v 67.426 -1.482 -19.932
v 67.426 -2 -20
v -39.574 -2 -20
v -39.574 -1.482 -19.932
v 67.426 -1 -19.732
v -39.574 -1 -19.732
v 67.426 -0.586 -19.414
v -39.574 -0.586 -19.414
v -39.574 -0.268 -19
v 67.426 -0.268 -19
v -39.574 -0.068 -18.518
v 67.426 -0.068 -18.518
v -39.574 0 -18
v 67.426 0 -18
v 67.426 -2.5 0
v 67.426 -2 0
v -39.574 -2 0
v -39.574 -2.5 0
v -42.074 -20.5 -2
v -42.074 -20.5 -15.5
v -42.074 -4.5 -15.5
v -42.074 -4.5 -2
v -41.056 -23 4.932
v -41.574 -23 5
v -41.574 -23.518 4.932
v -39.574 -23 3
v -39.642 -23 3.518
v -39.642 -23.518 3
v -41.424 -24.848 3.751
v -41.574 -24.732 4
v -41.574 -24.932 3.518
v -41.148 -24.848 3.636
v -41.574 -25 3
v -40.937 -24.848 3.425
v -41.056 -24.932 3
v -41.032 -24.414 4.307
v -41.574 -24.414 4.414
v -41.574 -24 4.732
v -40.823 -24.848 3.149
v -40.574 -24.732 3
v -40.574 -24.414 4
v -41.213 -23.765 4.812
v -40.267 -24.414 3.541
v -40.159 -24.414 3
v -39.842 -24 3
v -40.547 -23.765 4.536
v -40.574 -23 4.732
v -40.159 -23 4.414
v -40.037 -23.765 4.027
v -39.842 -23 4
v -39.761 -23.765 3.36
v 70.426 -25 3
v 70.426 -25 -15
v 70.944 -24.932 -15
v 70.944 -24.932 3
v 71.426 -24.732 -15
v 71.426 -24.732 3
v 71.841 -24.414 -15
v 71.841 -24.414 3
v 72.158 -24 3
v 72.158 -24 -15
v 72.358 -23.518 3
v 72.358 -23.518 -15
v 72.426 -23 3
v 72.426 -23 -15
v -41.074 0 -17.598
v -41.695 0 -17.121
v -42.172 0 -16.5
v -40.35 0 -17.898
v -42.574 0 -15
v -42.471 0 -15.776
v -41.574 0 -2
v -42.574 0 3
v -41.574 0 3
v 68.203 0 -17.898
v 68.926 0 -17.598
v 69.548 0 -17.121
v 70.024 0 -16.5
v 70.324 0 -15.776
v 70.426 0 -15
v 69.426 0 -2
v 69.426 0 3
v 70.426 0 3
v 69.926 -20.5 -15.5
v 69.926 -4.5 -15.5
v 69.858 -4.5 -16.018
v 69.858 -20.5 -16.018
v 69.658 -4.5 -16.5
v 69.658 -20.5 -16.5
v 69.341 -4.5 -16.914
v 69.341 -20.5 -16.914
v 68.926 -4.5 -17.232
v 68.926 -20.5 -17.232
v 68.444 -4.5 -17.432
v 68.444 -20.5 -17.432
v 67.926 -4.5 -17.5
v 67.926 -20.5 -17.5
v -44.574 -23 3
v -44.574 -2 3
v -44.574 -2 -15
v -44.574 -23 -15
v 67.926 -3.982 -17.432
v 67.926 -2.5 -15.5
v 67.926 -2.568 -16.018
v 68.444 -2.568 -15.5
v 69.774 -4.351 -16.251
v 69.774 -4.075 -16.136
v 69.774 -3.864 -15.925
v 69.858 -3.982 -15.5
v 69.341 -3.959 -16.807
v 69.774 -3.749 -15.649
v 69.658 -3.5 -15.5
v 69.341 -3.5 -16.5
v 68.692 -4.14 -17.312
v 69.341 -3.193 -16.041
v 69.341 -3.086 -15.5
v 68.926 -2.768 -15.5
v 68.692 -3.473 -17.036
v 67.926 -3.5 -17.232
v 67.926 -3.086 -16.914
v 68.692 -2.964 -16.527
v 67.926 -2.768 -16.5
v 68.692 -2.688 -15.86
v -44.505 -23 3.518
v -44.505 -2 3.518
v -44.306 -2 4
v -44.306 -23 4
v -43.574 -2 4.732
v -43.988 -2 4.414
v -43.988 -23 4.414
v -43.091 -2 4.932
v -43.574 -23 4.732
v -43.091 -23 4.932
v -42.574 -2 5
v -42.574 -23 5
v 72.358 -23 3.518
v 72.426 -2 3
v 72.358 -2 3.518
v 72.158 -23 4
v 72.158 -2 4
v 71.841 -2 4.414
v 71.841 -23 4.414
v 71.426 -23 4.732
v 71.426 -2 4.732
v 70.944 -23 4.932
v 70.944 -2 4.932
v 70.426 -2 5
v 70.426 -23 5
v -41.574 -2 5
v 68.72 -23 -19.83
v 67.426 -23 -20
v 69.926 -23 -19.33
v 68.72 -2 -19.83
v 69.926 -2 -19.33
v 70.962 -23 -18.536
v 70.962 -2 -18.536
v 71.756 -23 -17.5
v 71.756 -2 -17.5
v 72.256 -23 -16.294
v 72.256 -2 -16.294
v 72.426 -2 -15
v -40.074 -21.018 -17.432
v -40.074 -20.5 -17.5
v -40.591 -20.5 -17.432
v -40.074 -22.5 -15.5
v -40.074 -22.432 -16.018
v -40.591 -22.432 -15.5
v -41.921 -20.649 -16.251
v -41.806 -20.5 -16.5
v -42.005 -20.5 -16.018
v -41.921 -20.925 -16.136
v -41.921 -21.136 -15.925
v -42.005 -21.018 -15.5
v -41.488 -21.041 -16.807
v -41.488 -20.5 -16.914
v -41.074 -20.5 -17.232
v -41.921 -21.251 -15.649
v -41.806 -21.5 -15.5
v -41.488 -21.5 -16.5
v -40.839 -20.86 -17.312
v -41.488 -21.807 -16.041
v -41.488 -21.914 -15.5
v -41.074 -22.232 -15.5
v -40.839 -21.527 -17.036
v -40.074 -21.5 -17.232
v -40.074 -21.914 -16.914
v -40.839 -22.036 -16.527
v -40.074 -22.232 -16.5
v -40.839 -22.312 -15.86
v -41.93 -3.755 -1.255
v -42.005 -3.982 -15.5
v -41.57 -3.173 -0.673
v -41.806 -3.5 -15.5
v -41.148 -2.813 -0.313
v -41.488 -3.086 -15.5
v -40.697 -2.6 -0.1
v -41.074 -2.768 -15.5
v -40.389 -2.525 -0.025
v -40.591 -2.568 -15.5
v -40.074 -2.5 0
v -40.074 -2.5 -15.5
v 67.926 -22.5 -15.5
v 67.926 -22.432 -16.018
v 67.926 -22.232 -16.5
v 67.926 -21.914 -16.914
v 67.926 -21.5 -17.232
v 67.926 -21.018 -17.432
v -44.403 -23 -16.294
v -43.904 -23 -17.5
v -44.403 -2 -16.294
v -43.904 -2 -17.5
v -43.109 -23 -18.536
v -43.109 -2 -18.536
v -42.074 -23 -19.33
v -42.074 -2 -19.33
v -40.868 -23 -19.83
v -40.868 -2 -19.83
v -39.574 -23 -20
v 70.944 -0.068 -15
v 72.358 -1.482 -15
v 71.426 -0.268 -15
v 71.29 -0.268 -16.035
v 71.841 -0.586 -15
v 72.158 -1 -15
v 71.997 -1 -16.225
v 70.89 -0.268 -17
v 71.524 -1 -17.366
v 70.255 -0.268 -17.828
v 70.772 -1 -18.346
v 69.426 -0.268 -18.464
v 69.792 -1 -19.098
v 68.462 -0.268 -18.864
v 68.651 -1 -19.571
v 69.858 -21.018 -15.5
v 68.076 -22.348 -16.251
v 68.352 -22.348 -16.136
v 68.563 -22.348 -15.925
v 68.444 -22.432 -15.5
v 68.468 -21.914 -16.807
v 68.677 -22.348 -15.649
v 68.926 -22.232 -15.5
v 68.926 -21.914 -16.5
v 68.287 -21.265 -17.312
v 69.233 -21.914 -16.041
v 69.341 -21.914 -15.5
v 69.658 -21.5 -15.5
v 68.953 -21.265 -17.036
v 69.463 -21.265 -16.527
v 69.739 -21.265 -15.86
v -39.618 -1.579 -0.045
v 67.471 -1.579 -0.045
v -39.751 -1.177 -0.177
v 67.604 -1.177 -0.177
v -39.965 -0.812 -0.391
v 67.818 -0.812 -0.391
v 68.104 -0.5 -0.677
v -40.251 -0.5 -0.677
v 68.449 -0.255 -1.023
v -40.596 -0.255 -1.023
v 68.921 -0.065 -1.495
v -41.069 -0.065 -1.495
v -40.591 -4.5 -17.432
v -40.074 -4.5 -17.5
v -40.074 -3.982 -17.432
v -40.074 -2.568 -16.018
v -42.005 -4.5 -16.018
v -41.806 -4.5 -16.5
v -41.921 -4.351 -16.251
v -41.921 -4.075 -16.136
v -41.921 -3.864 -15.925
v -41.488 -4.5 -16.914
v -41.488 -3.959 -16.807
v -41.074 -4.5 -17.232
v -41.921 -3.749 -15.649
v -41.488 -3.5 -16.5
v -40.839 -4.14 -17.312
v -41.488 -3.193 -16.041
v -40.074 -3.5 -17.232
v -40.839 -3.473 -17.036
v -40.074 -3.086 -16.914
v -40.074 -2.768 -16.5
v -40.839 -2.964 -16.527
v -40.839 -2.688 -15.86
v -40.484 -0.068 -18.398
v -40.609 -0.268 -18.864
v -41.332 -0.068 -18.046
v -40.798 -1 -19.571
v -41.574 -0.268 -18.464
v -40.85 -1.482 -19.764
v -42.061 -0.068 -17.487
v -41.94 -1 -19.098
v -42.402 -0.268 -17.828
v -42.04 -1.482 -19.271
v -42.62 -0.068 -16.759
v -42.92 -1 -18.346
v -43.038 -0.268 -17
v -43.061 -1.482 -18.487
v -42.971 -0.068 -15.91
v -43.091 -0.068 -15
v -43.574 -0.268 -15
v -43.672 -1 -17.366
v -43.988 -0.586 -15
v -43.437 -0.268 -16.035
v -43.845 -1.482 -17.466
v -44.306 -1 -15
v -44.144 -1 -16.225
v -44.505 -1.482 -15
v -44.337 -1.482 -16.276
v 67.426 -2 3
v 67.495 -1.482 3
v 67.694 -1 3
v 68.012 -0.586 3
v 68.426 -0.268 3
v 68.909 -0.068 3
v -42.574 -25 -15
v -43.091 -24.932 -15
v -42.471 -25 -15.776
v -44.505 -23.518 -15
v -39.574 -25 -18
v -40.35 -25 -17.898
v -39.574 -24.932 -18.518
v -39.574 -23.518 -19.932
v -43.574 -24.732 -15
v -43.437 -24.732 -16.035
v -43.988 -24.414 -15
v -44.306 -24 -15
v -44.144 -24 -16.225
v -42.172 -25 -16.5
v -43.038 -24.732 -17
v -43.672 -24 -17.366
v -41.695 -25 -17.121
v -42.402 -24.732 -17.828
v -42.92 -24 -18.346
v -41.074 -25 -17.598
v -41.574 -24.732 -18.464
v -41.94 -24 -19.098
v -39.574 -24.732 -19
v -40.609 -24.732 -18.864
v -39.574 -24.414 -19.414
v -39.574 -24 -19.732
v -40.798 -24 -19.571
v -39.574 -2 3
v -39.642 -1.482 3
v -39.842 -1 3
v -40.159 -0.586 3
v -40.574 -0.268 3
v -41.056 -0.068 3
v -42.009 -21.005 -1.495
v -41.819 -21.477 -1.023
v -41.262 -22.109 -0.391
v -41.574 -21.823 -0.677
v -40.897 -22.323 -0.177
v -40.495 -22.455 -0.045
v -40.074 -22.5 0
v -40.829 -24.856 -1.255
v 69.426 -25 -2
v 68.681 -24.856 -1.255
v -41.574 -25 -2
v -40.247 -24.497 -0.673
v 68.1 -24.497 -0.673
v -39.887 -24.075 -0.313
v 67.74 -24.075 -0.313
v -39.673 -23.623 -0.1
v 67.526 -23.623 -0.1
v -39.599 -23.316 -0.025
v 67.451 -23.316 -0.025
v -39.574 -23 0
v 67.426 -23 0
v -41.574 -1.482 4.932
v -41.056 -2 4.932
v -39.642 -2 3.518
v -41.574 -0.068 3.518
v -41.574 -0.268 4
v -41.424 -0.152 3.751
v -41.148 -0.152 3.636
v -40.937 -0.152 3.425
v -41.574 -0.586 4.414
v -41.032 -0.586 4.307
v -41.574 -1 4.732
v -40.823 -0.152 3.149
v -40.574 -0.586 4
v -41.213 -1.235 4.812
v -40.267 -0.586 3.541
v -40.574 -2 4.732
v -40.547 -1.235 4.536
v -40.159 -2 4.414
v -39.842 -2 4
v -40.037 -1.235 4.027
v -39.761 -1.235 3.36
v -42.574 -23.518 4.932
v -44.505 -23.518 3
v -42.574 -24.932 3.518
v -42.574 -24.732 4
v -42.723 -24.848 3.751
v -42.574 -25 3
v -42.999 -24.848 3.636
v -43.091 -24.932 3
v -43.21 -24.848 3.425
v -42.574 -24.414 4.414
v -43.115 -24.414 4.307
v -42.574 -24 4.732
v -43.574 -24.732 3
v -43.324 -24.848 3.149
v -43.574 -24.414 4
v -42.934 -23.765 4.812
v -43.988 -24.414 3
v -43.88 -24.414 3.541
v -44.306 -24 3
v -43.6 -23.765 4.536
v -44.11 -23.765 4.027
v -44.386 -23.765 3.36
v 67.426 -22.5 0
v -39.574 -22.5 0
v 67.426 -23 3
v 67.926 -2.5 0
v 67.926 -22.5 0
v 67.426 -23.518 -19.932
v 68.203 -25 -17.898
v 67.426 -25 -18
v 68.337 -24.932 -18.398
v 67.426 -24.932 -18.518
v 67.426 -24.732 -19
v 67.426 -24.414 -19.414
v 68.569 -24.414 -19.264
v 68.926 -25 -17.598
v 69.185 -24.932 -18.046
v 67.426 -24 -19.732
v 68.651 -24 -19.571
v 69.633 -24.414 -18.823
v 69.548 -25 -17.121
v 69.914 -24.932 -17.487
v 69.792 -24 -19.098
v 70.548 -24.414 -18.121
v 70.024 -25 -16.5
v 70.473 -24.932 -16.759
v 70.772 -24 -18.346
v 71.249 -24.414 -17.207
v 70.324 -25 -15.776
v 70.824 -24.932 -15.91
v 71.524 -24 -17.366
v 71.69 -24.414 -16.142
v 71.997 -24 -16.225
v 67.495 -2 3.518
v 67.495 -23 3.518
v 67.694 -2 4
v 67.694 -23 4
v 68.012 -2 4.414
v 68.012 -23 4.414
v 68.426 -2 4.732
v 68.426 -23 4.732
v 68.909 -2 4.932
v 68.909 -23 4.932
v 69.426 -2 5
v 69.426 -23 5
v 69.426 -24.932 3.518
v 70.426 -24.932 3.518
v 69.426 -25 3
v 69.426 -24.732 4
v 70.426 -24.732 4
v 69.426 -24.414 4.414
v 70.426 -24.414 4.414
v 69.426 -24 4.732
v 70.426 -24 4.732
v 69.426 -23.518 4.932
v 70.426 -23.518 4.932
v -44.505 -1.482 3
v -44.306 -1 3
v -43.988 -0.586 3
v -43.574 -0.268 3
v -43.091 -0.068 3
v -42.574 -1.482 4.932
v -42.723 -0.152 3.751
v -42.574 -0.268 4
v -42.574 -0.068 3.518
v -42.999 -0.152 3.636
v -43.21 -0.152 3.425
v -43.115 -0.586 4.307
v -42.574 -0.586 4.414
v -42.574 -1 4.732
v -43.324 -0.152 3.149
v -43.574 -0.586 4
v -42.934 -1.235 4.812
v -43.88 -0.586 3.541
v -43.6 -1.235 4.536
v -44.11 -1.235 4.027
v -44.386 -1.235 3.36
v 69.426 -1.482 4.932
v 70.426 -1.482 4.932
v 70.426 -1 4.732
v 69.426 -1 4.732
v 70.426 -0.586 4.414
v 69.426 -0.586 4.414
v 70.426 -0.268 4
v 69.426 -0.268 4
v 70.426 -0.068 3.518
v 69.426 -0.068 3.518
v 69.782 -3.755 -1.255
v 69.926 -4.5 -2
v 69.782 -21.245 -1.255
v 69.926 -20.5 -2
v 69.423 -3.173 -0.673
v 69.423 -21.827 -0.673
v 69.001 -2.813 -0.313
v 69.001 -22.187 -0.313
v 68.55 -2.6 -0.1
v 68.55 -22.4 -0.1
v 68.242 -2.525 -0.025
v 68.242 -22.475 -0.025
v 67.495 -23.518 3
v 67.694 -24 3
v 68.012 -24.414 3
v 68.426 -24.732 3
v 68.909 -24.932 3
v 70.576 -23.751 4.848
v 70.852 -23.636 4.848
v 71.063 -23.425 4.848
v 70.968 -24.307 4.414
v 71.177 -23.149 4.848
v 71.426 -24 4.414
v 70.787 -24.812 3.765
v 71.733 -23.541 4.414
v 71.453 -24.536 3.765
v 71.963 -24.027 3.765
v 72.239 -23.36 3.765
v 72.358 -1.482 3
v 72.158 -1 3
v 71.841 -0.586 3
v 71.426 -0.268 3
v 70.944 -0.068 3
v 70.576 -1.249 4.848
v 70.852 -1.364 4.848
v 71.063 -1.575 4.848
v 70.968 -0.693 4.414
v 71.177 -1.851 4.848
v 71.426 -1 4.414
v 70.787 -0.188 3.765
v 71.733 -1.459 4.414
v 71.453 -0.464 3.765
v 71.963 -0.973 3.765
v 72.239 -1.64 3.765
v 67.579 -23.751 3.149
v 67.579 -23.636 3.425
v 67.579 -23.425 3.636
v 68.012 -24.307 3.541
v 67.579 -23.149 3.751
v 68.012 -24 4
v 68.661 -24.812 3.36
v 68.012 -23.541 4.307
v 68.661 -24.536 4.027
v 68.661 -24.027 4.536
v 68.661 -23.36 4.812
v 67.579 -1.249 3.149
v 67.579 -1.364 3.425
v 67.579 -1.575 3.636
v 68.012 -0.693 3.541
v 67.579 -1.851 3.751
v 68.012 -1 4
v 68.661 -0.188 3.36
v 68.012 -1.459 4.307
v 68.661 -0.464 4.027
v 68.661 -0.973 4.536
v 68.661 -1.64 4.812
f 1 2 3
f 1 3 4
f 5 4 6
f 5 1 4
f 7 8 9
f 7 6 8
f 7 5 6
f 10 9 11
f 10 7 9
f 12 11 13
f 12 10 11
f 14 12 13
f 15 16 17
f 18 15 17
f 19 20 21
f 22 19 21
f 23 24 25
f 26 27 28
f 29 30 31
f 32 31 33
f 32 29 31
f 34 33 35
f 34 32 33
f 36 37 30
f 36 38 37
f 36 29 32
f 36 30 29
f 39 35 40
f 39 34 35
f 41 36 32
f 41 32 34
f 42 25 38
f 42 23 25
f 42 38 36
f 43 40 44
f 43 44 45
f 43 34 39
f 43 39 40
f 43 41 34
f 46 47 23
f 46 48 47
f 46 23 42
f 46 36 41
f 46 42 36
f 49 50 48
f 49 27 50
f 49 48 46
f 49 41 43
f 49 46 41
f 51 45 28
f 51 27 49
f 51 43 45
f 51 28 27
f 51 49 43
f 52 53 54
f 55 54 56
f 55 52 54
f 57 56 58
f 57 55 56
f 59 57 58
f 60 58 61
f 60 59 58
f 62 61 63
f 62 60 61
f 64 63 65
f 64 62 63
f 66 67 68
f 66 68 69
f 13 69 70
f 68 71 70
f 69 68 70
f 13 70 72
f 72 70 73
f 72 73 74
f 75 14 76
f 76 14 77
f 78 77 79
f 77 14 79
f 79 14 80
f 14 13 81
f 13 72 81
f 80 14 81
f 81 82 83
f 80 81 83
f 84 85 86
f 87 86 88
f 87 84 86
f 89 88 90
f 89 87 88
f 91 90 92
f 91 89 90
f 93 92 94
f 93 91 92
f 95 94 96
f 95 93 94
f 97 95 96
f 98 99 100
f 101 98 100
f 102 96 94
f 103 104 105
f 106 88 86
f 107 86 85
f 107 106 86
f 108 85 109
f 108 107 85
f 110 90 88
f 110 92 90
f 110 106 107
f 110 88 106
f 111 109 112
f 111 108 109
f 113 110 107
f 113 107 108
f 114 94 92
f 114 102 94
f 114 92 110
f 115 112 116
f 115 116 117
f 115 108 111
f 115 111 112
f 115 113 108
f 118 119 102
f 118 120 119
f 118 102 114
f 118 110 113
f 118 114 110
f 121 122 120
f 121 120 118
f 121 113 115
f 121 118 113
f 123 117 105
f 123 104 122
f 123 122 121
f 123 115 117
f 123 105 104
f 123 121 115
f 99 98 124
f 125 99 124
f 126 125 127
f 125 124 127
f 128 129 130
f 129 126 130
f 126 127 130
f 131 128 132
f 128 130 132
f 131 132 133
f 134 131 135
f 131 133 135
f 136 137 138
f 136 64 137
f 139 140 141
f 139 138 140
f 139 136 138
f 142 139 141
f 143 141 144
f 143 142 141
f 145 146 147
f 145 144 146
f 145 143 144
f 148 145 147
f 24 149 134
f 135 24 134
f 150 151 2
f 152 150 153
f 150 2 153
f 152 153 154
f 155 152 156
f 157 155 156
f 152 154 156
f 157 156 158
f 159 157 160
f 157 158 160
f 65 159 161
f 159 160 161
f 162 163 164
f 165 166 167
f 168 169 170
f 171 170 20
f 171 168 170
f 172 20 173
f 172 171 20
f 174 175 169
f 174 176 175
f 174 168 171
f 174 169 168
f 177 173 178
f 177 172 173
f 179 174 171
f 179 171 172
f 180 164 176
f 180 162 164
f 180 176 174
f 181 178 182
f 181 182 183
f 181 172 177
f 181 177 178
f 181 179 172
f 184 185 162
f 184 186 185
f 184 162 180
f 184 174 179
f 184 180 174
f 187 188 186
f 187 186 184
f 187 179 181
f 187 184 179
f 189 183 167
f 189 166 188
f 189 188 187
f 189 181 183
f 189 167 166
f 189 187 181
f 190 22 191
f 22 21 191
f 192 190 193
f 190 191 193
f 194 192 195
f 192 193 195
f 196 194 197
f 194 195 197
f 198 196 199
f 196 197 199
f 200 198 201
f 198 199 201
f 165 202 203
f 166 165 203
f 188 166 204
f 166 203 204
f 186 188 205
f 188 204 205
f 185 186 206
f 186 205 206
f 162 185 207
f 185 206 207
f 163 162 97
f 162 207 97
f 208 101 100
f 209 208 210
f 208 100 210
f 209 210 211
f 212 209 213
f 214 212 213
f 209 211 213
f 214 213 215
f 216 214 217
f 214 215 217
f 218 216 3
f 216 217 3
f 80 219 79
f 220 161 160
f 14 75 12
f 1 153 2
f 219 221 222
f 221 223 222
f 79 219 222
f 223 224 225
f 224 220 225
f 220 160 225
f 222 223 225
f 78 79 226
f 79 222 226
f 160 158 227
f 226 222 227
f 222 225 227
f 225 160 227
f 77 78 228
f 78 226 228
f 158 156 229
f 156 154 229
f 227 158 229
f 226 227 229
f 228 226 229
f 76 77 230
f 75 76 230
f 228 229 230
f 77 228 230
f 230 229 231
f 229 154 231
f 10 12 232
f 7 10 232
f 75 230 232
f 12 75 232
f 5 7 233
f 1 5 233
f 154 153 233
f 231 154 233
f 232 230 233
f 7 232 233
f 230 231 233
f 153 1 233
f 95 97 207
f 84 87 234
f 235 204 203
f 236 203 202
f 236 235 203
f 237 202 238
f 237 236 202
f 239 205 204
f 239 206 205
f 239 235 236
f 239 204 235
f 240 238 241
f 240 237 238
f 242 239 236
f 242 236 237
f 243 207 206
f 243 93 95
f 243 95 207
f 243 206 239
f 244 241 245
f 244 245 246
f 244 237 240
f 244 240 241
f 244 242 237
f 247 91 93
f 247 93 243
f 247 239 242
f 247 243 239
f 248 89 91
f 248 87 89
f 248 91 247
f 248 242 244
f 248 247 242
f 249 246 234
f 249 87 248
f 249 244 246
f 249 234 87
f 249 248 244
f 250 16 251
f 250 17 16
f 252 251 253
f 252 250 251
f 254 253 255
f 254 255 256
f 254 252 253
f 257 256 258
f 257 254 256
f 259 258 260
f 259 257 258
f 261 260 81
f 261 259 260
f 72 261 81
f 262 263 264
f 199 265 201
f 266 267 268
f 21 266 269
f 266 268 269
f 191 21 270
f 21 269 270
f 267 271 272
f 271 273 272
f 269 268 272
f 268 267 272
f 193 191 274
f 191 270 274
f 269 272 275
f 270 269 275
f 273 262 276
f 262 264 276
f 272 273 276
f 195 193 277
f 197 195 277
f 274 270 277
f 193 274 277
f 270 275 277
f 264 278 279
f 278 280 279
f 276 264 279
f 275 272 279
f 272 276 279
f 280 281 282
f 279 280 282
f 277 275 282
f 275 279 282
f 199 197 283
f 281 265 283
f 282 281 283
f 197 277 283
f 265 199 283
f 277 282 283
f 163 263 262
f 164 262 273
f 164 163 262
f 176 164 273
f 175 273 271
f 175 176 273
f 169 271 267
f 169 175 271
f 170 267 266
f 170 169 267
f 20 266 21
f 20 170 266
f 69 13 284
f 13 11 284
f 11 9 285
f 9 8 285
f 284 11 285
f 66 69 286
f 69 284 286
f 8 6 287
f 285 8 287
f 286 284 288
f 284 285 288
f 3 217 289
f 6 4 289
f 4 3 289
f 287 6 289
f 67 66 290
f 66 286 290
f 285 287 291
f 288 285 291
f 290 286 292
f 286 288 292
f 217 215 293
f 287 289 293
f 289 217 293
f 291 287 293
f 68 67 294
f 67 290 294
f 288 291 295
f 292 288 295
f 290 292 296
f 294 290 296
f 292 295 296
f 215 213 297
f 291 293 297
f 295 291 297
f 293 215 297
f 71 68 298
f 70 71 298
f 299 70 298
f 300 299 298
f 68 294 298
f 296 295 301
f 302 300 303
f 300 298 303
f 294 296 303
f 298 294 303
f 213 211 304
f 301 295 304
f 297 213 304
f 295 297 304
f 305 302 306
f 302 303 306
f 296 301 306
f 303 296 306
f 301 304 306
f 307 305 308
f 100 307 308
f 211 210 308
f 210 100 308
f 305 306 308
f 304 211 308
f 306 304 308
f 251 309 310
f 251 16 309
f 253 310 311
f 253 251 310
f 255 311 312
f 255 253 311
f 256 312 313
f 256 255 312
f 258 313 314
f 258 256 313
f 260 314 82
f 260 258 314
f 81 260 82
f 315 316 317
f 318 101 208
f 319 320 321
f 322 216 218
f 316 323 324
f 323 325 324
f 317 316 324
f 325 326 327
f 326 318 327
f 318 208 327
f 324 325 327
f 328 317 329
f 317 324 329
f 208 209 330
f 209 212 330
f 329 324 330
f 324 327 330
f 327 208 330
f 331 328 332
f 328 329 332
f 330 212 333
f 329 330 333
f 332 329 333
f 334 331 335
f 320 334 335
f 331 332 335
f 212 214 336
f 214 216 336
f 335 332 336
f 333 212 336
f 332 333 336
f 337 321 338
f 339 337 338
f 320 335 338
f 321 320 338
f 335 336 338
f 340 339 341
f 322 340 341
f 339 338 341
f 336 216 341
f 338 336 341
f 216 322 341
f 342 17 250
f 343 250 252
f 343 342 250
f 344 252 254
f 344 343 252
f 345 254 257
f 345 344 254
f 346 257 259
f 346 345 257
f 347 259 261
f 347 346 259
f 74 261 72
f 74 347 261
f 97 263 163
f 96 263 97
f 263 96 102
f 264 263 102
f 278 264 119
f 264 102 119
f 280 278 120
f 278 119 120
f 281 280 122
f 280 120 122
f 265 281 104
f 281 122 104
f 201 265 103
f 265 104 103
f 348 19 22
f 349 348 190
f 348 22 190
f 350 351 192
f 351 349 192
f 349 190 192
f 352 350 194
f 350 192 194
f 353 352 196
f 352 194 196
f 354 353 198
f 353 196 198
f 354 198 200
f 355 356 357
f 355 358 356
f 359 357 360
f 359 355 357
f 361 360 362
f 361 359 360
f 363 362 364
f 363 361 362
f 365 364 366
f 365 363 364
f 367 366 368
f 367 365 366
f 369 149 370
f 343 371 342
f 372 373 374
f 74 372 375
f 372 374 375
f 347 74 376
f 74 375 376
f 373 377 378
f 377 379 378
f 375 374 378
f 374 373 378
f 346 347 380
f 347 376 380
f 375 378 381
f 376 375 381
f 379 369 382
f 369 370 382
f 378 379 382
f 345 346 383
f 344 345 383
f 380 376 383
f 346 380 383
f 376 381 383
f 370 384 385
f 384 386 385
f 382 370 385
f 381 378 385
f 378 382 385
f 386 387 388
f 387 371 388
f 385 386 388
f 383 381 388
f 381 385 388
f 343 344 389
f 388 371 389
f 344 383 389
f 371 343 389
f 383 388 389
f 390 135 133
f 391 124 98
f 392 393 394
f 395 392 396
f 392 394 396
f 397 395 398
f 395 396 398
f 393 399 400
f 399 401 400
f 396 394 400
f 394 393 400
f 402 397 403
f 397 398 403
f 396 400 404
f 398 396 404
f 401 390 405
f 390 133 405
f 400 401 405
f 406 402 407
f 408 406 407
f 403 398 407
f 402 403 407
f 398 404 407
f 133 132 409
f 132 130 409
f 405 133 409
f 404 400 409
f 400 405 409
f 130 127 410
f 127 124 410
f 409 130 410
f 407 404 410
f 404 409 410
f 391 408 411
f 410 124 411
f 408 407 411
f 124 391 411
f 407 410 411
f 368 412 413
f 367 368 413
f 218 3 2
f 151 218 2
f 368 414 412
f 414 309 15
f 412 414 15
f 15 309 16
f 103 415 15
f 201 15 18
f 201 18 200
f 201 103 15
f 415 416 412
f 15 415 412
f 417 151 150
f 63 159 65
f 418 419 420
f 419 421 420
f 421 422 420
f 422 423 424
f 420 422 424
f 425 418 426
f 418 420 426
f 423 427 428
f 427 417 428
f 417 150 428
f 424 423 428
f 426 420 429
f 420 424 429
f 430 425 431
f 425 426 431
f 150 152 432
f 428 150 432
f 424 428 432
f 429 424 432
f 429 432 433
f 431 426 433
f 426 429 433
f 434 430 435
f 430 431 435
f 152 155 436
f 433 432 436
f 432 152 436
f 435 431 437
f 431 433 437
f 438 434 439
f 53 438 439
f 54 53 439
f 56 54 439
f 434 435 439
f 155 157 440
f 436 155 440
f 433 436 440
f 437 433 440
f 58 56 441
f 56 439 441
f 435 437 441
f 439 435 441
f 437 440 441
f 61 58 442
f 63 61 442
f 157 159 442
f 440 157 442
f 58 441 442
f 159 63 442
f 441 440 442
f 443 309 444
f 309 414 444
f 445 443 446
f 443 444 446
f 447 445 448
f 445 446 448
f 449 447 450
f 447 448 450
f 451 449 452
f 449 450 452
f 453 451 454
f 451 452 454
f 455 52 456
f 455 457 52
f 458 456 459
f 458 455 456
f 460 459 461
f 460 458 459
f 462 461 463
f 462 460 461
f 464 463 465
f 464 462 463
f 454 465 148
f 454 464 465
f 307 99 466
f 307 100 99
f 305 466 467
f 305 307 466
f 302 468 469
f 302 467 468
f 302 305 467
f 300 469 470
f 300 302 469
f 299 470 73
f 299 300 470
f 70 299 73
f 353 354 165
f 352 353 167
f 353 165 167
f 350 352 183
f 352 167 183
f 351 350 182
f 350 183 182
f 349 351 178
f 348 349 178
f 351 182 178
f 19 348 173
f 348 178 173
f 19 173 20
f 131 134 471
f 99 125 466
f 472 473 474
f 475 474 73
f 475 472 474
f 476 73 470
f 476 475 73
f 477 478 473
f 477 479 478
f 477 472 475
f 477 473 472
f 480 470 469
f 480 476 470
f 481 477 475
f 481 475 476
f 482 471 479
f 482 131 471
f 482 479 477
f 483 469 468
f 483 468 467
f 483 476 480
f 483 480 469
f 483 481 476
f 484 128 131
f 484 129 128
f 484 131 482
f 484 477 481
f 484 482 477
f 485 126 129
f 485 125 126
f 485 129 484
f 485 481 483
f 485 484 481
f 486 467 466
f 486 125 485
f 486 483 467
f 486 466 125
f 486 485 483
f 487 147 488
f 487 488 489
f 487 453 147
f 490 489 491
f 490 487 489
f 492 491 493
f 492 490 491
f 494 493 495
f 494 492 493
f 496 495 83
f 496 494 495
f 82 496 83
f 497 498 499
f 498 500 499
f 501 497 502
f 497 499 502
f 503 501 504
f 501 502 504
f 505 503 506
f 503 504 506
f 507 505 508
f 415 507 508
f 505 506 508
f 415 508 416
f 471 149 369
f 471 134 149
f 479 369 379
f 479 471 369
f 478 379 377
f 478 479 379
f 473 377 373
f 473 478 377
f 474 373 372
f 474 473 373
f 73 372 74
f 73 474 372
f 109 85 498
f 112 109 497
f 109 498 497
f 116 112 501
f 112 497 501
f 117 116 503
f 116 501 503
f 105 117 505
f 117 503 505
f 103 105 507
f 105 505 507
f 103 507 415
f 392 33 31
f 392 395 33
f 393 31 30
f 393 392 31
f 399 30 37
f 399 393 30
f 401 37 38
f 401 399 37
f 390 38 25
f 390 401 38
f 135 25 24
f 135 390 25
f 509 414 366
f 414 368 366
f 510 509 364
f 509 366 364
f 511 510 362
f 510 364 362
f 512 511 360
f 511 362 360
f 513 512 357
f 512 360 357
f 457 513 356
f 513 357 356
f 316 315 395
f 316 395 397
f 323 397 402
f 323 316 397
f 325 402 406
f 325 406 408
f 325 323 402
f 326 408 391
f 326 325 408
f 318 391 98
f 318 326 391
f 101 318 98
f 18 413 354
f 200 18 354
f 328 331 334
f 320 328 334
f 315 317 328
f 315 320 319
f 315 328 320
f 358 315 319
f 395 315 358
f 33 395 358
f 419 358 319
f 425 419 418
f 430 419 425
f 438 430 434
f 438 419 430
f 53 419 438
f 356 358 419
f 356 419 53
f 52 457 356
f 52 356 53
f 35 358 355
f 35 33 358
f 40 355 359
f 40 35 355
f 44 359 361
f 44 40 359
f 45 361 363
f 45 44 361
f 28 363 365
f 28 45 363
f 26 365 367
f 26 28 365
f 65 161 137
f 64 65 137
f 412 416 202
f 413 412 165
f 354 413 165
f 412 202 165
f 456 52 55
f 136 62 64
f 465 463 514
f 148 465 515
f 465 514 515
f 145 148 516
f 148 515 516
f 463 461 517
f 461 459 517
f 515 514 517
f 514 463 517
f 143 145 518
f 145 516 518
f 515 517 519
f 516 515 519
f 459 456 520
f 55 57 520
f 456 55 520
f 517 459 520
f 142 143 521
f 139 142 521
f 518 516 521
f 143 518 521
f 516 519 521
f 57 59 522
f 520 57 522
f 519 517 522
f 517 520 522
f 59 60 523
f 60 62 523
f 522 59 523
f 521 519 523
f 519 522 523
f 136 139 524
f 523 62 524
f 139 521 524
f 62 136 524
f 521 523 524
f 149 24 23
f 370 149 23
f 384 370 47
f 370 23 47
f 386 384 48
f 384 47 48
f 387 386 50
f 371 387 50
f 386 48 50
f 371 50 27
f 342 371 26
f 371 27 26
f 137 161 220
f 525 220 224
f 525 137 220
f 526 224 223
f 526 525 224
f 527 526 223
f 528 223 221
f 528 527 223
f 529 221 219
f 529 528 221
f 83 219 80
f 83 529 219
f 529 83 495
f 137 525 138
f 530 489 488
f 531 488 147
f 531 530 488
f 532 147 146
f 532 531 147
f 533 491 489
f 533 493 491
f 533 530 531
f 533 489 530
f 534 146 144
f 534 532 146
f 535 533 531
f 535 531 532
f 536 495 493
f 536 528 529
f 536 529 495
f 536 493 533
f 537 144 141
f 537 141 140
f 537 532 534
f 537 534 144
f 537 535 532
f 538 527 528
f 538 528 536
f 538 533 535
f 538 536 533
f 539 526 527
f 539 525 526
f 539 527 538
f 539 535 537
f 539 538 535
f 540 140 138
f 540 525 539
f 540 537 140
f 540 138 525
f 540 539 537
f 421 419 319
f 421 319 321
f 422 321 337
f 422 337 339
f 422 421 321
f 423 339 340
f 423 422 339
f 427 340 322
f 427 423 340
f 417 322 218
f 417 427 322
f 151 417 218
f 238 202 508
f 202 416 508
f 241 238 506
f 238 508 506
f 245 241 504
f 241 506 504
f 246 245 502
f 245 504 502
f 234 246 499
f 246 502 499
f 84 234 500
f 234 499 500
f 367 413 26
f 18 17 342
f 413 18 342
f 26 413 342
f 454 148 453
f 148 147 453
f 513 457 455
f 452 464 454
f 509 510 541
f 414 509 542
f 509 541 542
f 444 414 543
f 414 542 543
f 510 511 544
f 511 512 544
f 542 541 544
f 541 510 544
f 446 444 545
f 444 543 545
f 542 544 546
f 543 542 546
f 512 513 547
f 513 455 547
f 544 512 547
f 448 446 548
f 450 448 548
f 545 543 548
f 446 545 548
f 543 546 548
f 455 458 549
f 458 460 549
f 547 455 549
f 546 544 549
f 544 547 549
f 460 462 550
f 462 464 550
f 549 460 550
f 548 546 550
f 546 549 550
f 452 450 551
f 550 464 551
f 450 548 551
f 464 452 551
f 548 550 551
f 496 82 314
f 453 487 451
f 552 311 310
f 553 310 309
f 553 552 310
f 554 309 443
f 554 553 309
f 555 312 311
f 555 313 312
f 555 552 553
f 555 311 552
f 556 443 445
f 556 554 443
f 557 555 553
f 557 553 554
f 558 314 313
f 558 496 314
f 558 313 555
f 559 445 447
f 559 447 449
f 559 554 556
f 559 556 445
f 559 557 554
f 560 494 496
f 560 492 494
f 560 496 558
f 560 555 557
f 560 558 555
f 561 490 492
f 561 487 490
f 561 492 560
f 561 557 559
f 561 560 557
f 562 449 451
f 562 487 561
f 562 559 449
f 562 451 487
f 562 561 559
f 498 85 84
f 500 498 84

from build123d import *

# Parameters (mm, degrees)
F1_DEPTH     = 25
F2_T         = -2.5
F3_R         = 2
F4_T1_DEPTH  = 25
F4_T4_ANGLE  = 90
F4_T6_ANGLE  = 90
F4_T8_ANGLE  = 90
F4_T10_ANGLE = 90


# Not quite as in the source:
# - a fillet or chamfer that OpenCascade refuses, or shapes differently, is made with other operations: its cross-section is extruded or revolved along the edge and cut away or added
# - a shell that OpenCascade refuses in one call is made with other operations: the cavity is built on its own and cut out


with BuildPart() as f1:
    # F0 (on Front) → F1 (new body)
    with BuildSketch(Plane.XZ):
        Polygon((67.4263688624, 0), (-39.5736311376, 0), (-39.5736311376, 5), (-44.5736311376, 5), (-44.5736311376, -20), (72.4263688624, -20), (72.4263688624, 5), (67.4263688624, 5), align=None)
    extrude(amount=F1_DEPTH)

    # F2: a shell. OpenCascade refuses it in one call, so the cavity is built on its own and cut out:
    # the body offset inwards by the wall thickness, plus a prism from it out through each open face.
    f2_core = offset(f1.part, amount=F2_T, kind=Kind.INTERSECTION, mode=Mode.PRIVATE)
    f2_exits = [f2_core.faces().sort_by_distance(p)[0] for p in [
        (13.926369, -12.5, -2.5),
    ]]
    add(f2_core, mode=Mode.SUBTRACT)
    extrude(f2_exits, amount=-F2_T, mode=Mode.SUBTRACT)

    # F3
    f3_edges = [f1.edges().sort_by_distance(p)[0] for p in [
        (-39.573631, -12.5, 5),
        (-44.573631, -12.5, 5),
        (-42.073631, 0, 5),
        (-42.073631, -25, 5),
        (13.926369, -25, 0),
        (-39.573631, -25, 2.5),
        (-44.573631, -25, -7.5),
        (13.926369, -25, -20),
        (72.426369, -25, -7.5),
        (69.926369, -25, 5),
        (67.426369, -25, 2.5),
        (13.926369, 0, 0),
        (-39.573631, 0, 2.5),
        (-44.573631, 0, -7.5),
        (13.926369, 0, -20),
        (72.426369, 0, -7.5),
        (69.926369, 0, 5),
        (67.426369, 0, 2.5),
        (13.926369, -2.5, -17.5),
        (69.926369, -12.5, -17.5),
        (13.926369, -22.5, -17.5),
        (-42.073631, -12.5, -17.5),
        (-42.073631, -22.5, -8.75),
        (-42.073631, -12.5, 0),
        (-42.073631, -2.5, -8.75),
        (69.926369, -12.5, 0),
        (69.926369, -22.5, -8.75),
        (69.926369, -2.5, -8.75),
        (72.426369, -12.5, 5),
        (67.426369, -12.5, 5),
    ]]
    fillet(f3_edges, radius=F3_R)

    # F4: fillet of radius 5 on 2 edges, made by hand

    # F4_s2 → F4_t1 (cut)
    with BuildSketch(Plane.XZ):
        with BuildLine():
            ThreePointArc((67.4263688624, -20), (70.9619027683, -18.5355339059), (72.4263688624, -15))
            Line((72.4263688624, -15), (72.4263688624, -20))
            Line((72.4263688624, -20), (67.4263688624, -20))
        make_face()
        with BuildLine():
            ThreePointArc((-44.5736311376, -15), (-43.1091650435, -18.5355339059), (-39.5736311376, -20))
            Line((-39.5736311376, -20), (-44.5736311376, -20))
            Line((-44.5736311376, -20), (-44.5736311376, -15))
        make_face()
    extrude(amount=F4_T1_DEPTH, mode=Mode.SUBTRACT)

    # F4_s3 → F4_t4 (revolve, cut)
    with BuildSketch(Plane.YZ.offset(-39.5736311376)):
        with BuildLine():
            ThreePointArc((0, -18), (-0.5857864376, -19.4142135624), (-2, -20))
            Line((-2, -20), (0, -20))
            Line((0, -20), (0, -18))
        make_face()
    revolve(axis=Axis((-39.5736311376, 0, -15), (0, 1, 0)), revolution_arc=F4_T4_ANGLE, mode=Mode.SUBTRACT)

    # F4_s5 → F4_t6 (revolve, cut)
    with BuildSketch(Plane.XY.offset(-15)):
        with BuildLine():
            ThreePointArc((-42.5736311376, -25), (-43.9878447, -24.4142135624), (-44.5736311376, -23))
            Line((-44.5736311376, -23), (-44.5736311376, -25))
            Line((-44.5736311376, -25), (-42.5736311376, -25))
        make_face()
    revolve(axis=Axis((-39.5736311376, -25, -15), (0, -1, 0)), revolution_arc=F4_T6_ANGLE, mode=Mode.SUBTRACT)

    # F4_s7 → F4_t8 (revolve, cut)
    with BuildSketch(Plane.XY.offset(-15)):
        with BuildLine():
            ThreePointArc((70.4263688624, 0), (71.8405824248, -0.5857864376), (72.4263688624, -2))
            Line((72.4263688624, -2), (72.4263688624, 0))
            Line((72.4263688624, 0), (70.4263688624, 0))
        make_face()
    revolve(axis=Axis((67.4263688624, 0, -15), (0, 1, 0)), revolution_arc=F4_T8_ANGLE, mode=Mode.SUBTRACT)

    # F4_s9 → F4_t10 (revolve, cut)
    with BuildSketch(Plane.YZ.offset(67.4263688624)):
        with BuildLine():
            ThreePointArc((-25, -18), (-24.4142135624, -19.4142135624), (-23, -20))
            Line((-23, -20), (-25, -20))
            Line((-25, -20), (-25, -18))
        make_face()
    revolve(axis=Axis((67.4263688624, -25, -15), (0, -1, 0)), revolution_arc=F4_T10_ANGLE, mode=Mode.SUBTRACT)


solid = f1.part
